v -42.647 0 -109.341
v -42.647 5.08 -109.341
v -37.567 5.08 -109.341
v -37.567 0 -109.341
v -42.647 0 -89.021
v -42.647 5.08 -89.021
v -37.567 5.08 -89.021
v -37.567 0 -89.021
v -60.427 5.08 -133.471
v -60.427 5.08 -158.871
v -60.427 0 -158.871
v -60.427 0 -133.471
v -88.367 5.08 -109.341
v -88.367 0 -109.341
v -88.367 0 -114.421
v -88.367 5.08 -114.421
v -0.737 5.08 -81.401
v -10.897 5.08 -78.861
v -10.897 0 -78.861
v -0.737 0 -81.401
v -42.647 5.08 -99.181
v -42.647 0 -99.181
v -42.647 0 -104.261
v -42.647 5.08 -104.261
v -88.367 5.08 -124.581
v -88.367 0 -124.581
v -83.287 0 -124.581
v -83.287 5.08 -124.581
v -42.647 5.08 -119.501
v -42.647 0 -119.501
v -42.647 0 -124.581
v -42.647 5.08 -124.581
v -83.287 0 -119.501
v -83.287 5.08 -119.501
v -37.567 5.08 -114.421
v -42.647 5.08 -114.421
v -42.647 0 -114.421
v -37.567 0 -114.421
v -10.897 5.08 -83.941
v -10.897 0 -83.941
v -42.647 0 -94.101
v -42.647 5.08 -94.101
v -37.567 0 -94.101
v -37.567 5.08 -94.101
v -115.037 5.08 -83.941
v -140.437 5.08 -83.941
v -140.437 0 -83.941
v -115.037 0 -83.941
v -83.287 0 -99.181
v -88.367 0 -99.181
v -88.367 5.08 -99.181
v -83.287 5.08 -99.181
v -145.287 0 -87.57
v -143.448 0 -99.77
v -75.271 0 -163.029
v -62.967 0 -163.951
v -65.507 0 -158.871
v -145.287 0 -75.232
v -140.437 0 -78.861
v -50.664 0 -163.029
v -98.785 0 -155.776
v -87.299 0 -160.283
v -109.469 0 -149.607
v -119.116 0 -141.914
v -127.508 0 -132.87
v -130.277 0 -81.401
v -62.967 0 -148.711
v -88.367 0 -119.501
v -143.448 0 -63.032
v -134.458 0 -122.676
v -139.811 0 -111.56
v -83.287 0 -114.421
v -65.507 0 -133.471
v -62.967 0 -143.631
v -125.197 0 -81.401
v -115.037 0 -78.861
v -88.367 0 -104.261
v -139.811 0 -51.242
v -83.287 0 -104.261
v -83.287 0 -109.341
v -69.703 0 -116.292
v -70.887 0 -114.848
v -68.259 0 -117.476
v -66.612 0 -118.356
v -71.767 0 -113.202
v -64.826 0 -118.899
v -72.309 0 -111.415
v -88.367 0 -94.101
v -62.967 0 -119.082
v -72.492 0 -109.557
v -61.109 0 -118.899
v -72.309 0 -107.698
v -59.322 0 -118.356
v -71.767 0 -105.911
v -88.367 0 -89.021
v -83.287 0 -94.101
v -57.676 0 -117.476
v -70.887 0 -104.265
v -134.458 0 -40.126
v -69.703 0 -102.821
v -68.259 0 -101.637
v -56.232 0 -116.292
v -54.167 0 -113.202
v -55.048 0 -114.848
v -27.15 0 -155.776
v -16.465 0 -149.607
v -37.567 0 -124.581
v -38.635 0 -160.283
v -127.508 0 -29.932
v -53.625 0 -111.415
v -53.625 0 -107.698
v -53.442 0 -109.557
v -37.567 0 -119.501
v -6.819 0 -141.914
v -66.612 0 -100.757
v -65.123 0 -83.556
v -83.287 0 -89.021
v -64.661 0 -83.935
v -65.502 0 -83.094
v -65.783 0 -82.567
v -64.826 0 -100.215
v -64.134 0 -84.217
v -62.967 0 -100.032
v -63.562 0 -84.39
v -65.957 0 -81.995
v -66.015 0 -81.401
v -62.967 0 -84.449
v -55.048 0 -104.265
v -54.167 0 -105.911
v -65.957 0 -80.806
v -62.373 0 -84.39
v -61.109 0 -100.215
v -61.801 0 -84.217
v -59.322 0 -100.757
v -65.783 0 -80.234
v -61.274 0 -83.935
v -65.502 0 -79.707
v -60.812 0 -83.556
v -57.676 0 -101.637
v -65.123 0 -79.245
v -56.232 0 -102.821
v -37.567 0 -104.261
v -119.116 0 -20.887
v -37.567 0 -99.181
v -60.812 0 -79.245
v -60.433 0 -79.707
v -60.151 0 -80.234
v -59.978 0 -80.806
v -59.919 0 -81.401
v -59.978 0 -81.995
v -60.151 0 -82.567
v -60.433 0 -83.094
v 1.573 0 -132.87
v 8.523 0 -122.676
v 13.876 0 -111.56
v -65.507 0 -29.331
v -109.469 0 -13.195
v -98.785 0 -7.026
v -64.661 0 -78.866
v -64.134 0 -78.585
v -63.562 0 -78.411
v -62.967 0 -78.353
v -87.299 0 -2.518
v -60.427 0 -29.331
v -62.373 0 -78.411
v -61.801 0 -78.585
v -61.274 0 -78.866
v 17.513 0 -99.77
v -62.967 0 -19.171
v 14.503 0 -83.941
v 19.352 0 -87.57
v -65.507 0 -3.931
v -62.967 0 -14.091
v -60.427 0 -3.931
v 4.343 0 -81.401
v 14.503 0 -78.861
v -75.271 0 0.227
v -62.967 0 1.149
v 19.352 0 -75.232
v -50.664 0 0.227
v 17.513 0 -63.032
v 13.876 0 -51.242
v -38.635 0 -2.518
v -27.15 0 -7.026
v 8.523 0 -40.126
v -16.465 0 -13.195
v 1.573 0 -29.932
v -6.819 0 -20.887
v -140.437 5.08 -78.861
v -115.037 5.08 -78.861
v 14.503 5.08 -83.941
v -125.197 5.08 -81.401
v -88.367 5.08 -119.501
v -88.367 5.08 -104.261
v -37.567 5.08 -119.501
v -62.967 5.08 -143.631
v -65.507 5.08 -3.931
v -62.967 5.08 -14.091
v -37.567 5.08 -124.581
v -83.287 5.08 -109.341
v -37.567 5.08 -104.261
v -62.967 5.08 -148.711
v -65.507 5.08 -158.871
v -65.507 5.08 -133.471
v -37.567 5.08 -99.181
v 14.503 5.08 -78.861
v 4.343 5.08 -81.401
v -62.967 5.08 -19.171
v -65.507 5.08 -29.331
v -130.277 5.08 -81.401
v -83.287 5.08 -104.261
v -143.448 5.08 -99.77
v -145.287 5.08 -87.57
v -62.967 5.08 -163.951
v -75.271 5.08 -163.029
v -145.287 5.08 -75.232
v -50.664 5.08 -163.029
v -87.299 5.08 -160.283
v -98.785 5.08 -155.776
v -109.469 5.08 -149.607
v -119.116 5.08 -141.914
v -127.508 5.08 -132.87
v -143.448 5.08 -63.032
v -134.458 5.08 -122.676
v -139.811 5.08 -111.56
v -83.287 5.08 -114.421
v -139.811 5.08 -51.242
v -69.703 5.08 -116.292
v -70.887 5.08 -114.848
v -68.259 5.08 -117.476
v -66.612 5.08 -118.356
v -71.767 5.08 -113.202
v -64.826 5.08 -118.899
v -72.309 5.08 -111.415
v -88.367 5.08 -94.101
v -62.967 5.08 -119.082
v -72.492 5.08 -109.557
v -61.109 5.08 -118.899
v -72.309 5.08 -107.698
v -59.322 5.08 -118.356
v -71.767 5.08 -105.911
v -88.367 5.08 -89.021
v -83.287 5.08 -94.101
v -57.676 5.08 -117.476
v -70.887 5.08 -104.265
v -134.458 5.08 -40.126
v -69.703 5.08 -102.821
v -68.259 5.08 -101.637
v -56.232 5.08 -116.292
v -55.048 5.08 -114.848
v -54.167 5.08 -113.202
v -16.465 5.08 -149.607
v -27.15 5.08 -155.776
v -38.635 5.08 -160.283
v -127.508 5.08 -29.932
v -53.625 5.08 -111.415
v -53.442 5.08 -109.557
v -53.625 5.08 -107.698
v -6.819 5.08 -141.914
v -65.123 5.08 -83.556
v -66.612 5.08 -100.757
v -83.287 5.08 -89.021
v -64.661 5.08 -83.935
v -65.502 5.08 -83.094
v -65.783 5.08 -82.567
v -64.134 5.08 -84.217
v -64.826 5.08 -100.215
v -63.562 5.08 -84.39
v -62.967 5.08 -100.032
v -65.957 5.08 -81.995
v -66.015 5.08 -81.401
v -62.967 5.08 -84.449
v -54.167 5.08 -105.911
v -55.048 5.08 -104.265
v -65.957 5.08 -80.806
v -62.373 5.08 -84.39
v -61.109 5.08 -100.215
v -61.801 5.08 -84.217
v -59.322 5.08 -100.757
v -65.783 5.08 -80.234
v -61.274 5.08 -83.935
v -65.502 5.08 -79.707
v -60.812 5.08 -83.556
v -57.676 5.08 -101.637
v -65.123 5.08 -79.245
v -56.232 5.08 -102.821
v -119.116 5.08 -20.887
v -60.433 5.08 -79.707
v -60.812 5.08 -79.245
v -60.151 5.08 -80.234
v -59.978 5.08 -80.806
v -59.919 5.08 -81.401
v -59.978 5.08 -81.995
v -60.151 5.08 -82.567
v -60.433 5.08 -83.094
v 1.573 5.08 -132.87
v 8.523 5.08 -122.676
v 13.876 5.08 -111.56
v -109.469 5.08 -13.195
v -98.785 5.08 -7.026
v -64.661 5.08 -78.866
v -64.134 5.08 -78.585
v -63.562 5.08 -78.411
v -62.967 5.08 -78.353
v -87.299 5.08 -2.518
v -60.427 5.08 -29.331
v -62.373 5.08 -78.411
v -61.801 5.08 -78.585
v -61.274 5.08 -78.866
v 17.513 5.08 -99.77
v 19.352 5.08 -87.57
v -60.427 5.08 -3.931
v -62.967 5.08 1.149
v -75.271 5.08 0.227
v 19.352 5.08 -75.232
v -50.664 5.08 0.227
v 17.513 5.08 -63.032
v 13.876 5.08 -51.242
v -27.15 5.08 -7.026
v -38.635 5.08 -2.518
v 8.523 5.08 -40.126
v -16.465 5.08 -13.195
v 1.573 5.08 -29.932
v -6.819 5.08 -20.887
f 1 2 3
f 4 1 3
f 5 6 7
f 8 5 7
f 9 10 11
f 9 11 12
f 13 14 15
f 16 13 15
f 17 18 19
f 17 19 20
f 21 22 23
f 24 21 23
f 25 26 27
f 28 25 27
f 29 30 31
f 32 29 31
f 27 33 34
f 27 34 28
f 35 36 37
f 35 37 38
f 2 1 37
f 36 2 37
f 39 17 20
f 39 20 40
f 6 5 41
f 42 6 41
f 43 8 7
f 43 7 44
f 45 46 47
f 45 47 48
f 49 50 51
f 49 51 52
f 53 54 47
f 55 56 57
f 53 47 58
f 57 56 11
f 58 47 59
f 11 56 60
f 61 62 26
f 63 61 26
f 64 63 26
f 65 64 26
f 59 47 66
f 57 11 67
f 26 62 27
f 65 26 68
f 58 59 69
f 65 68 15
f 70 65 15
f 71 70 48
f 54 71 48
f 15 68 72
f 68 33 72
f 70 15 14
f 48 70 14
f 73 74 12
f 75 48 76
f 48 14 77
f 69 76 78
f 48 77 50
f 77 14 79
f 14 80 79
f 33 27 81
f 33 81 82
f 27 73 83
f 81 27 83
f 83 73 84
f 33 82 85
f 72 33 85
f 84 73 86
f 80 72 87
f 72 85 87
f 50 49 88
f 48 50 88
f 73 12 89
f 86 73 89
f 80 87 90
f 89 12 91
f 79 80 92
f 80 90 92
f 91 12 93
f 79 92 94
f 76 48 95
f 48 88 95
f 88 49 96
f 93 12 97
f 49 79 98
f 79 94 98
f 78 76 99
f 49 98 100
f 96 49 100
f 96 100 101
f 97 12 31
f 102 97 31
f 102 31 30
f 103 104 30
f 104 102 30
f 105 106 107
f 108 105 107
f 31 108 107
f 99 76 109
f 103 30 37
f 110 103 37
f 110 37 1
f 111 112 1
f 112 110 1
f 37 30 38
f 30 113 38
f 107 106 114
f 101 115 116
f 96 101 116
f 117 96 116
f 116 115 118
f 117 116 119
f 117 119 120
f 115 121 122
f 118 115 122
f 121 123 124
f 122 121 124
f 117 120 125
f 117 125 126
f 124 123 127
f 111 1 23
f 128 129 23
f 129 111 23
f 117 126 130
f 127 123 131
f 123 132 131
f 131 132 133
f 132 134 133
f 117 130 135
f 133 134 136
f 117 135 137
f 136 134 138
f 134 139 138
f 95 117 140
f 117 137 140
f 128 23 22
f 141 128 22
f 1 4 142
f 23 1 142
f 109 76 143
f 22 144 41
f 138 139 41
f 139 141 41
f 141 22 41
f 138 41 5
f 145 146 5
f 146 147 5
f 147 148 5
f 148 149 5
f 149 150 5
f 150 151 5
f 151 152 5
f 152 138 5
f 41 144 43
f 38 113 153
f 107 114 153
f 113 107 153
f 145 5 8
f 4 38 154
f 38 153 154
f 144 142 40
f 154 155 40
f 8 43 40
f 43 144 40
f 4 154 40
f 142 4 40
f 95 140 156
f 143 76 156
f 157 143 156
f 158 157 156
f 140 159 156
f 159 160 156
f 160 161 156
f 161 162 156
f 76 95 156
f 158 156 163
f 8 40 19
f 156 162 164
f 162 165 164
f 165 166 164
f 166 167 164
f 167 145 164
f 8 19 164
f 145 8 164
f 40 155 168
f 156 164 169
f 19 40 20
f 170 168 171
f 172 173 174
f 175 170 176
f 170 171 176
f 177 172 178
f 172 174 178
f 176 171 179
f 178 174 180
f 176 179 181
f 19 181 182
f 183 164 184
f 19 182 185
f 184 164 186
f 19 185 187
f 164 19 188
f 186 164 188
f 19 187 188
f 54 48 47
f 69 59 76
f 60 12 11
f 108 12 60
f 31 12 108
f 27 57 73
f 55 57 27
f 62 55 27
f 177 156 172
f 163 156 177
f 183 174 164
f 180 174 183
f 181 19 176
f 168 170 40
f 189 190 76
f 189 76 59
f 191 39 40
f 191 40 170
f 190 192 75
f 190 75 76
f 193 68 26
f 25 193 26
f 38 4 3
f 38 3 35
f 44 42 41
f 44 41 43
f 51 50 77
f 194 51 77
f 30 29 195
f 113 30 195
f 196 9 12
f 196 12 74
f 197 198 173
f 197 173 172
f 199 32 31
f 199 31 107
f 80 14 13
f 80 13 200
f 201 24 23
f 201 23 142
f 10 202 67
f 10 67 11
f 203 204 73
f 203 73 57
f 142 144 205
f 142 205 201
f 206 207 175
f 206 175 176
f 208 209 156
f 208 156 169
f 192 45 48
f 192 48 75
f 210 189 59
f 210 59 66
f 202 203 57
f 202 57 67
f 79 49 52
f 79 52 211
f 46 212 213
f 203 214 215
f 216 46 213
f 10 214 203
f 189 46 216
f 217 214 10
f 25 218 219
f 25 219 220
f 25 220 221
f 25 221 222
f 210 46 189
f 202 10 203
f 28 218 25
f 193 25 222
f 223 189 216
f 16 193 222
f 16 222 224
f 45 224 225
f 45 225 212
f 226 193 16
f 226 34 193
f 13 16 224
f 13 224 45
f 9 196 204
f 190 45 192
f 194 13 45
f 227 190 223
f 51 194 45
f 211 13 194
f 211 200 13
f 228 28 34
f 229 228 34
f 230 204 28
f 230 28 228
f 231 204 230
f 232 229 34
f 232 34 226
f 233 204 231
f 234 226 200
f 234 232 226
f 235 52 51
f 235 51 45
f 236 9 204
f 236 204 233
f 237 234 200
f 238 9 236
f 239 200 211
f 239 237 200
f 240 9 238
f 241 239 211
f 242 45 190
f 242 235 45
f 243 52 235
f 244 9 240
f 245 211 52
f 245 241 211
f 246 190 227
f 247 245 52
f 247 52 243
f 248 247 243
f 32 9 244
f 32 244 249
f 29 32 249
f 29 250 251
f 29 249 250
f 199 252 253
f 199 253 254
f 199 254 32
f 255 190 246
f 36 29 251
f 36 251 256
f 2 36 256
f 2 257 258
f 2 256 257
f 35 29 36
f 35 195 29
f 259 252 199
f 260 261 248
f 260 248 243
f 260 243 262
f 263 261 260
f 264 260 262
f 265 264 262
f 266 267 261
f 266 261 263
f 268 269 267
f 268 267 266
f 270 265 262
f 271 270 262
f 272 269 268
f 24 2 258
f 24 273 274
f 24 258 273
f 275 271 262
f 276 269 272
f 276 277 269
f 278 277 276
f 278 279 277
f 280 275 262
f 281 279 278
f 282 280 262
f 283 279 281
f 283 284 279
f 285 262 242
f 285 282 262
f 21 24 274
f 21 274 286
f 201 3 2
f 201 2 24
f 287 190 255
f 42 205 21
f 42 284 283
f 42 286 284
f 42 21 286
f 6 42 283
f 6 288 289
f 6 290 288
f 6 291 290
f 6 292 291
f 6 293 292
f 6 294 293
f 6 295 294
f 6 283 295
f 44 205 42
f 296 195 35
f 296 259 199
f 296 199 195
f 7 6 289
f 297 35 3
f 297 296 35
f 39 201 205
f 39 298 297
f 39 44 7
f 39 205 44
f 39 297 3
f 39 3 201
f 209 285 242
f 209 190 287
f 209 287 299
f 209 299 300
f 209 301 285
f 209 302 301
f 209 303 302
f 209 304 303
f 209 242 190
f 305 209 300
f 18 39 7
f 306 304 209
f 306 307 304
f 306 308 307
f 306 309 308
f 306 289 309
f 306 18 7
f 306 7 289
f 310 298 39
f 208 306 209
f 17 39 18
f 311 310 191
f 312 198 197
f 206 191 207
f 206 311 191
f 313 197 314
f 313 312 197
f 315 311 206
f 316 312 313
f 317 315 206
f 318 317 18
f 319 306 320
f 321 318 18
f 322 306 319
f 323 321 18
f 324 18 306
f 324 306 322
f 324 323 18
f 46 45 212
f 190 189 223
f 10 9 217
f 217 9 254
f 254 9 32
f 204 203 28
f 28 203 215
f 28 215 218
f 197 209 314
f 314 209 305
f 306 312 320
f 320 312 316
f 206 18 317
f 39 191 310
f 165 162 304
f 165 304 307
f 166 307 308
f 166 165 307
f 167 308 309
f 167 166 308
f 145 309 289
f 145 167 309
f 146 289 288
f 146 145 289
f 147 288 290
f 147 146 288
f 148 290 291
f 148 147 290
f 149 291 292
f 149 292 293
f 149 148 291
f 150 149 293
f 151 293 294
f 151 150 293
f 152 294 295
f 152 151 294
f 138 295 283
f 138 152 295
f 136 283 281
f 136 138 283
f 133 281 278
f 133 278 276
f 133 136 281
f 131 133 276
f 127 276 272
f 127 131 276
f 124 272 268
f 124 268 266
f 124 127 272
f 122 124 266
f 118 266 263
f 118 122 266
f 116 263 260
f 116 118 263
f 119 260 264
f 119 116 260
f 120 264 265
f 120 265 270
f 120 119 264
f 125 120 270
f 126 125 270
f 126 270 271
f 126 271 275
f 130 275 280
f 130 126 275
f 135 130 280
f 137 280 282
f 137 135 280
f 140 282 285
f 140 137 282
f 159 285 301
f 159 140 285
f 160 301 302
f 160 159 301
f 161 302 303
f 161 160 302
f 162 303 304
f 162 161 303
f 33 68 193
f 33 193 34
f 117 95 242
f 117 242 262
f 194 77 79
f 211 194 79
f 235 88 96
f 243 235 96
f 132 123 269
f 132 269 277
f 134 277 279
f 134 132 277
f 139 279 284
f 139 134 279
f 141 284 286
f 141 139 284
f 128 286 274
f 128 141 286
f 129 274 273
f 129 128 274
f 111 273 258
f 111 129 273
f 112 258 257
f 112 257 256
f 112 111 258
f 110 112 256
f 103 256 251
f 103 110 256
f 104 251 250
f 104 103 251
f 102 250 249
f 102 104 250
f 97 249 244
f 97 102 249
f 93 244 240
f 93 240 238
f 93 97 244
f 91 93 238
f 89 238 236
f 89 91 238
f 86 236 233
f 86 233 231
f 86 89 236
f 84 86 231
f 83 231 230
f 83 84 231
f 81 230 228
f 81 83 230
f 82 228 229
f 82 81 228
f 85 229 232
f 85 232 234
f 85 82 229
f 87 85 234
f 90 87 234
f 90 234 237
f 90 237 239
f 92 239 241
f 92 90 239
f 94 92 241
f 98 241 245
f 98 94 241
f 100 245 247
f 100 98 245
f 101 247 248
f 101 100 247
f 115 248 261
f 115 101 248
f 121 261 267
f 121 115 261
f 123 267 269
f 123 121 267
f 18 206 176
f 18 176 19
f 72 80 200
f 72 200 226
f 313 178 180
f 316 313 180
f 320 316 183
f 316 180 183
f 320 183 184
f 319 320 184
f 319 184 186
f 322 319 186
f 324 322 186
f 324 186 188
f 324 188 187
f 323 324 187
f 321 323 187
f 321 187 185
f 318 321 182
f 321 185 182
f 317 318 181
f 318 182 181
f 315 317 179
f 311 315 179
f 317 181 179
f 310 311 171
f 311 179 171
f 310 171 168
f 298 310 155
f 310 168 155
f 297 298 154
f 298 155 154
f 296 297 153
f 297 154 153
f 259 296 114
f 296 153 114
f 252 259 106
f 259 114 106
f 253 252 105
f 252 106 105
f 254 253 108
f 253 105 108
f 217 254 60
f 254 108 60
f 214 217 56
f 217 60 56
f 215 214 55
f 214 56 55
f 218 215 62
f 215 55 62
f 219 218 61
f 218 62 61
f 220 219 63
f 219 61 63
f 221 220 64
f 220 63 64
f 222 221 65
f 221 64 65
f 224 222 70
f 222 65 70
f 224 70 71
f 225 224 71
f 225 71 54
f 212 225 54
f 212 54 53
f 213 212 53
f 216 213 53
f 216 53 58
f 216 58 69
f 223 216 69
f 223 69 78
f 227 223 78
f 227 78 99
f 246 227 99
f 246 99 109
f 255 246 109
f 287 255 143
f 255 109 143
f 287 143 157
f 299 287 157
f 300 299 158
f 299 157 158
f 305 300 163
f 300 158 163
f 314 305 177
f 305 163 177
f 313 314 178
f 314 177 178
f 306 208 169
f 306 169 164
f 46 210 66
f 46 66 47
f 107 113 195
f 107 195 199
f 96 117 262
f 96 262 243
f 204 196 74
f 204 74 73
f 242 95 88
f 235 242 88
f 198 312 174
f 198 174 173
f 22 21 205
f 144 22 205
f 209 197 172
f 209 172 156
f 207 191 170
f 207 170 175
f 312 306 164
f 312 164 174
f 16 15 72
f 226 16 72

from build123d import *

# Parameters (mm, degrees)
SKETCH1_R           = 82.55
SKETCH1_R_2         = 3.048
SKETCH1_R_3         = 9.525
SKETCH1_W           = 5.08
SKETCH1_H           = 5.08
BOSS_EXTRUDE1_DEPTH = 5.08
CUT_EXTRUDE1_DEPTH  = 5.08


with BuildPart() as part:
    # Sketch1 → Boss-Extrude1 (new body)
    with BuildSketch(Plane(origin=(0, 0, 0), x_dir=(1, 0, 0), z_dir=(0, 1, 0))):
        with Locations(Location((-62.967414891, 81.40064069, 0), (0, 0, 270))):
            Circle(SKETCH1_R)
        with Locations(Location((-62.967414891, 81.40064069, 0), (0, 0, 270))):
            Circle(SKETCH1_R_2, mode=Mode.SUBTRACT)
        with Locations(Location((-62.967414891, 109.55654069, 0), (0, 0, 270))):
            Circle(SKETCH1_R_3, mode=Mode.SUBTRACT)
        with Locations((-85.827414891, 111.88064069)):
            Rectangle(SKETCH1_W, SKETCH1_H, mode=Mode.SUBTRACT)
        with Locations((-85.827414891, 91.56064069)):
            Rectangle(SKETCH1_W, SKETCH1_H, mode=Mode.SUBTRACT)
        with Locations((-85.827414891, 101.72064069)):
            Rectangle(SKETCH1_W, SKETCH1_H, mode=Mode.SUBTRACT)
        with Locations((-85.827414891, 122.04064069)):
            Rectangle(SKETCH1_W, SKETCH1_H, mode=Mode.SUBTRACT)
        with Locations((-40.107414891, 122.04064069)):
            Rectangle(SKETCH1_W, SKETCH1_H, mode=Mode.SUBTRACT)
        with Locations((-40.107414891, 111.88064069)):
            Rectangle(SKETCH1_W, SKETCH1_H, mode=Mode.SUBTRACT)
        with Locations((-40.107414891, 101.72064069)):
            Rectangle(SKETCH1_W, SKETCH1_H, mode=Mode.SUBTRACT)
        with Locations((-40.107414891, 91.56064069)):
            Rectangle(SKETCH1_W, SKETCH1_H, mode=Mode.SUBTRACT)
    extrude(amount=BOSS_EXTRUDE1_DEPTH)

    # Sketch2 → Cut-Extrude1 (cut)
    with BuildSketch(Plane(origin=(0, 5.08, 0), x_dir=(1, 0, 0), z_dir=(0, 1, 0))):
        Polygon((-62.967414891, 148.71064069), (-60.427414891, 158.87064069), (-60.427414891, 133.47064069), (-62.967414891, 143.63064069), (-65.507414891, 133.47064069), (-65.507414891, 158.87064069), align=None)
        Polygon((4.342585109, 81.40064069), (14.502585109, 78.86064069), (-10.897414891, 78.86064069), (-0.737414891, 81.40064069), (-10.897414891, 83.94064069), (14.502585109, 83.94064069), align=None)
        Polygon((-62.967414891, 14.09064069), (-65.507414891, 3.93064069), (-65.507414891, 29.33064069), (-62.967414891, 19.17064069), (-60.427414891, 29.33064069), (-60.427414891, 3.93064069), align=None)
        Polygon((-130.277414891, 81.40064069), (-140.437414891, 83.94064069), (-115.037414891, 83.94064069), (-125.197414891, 81.40064069), (-115.037414891, 78.86064069), (-140.437414891, 78.86064069), align=None)
    extrude(amount=-CUT_EXTRUDE1_DEPTH, mode=Mode.SUBTRACT)


solid = part.part
